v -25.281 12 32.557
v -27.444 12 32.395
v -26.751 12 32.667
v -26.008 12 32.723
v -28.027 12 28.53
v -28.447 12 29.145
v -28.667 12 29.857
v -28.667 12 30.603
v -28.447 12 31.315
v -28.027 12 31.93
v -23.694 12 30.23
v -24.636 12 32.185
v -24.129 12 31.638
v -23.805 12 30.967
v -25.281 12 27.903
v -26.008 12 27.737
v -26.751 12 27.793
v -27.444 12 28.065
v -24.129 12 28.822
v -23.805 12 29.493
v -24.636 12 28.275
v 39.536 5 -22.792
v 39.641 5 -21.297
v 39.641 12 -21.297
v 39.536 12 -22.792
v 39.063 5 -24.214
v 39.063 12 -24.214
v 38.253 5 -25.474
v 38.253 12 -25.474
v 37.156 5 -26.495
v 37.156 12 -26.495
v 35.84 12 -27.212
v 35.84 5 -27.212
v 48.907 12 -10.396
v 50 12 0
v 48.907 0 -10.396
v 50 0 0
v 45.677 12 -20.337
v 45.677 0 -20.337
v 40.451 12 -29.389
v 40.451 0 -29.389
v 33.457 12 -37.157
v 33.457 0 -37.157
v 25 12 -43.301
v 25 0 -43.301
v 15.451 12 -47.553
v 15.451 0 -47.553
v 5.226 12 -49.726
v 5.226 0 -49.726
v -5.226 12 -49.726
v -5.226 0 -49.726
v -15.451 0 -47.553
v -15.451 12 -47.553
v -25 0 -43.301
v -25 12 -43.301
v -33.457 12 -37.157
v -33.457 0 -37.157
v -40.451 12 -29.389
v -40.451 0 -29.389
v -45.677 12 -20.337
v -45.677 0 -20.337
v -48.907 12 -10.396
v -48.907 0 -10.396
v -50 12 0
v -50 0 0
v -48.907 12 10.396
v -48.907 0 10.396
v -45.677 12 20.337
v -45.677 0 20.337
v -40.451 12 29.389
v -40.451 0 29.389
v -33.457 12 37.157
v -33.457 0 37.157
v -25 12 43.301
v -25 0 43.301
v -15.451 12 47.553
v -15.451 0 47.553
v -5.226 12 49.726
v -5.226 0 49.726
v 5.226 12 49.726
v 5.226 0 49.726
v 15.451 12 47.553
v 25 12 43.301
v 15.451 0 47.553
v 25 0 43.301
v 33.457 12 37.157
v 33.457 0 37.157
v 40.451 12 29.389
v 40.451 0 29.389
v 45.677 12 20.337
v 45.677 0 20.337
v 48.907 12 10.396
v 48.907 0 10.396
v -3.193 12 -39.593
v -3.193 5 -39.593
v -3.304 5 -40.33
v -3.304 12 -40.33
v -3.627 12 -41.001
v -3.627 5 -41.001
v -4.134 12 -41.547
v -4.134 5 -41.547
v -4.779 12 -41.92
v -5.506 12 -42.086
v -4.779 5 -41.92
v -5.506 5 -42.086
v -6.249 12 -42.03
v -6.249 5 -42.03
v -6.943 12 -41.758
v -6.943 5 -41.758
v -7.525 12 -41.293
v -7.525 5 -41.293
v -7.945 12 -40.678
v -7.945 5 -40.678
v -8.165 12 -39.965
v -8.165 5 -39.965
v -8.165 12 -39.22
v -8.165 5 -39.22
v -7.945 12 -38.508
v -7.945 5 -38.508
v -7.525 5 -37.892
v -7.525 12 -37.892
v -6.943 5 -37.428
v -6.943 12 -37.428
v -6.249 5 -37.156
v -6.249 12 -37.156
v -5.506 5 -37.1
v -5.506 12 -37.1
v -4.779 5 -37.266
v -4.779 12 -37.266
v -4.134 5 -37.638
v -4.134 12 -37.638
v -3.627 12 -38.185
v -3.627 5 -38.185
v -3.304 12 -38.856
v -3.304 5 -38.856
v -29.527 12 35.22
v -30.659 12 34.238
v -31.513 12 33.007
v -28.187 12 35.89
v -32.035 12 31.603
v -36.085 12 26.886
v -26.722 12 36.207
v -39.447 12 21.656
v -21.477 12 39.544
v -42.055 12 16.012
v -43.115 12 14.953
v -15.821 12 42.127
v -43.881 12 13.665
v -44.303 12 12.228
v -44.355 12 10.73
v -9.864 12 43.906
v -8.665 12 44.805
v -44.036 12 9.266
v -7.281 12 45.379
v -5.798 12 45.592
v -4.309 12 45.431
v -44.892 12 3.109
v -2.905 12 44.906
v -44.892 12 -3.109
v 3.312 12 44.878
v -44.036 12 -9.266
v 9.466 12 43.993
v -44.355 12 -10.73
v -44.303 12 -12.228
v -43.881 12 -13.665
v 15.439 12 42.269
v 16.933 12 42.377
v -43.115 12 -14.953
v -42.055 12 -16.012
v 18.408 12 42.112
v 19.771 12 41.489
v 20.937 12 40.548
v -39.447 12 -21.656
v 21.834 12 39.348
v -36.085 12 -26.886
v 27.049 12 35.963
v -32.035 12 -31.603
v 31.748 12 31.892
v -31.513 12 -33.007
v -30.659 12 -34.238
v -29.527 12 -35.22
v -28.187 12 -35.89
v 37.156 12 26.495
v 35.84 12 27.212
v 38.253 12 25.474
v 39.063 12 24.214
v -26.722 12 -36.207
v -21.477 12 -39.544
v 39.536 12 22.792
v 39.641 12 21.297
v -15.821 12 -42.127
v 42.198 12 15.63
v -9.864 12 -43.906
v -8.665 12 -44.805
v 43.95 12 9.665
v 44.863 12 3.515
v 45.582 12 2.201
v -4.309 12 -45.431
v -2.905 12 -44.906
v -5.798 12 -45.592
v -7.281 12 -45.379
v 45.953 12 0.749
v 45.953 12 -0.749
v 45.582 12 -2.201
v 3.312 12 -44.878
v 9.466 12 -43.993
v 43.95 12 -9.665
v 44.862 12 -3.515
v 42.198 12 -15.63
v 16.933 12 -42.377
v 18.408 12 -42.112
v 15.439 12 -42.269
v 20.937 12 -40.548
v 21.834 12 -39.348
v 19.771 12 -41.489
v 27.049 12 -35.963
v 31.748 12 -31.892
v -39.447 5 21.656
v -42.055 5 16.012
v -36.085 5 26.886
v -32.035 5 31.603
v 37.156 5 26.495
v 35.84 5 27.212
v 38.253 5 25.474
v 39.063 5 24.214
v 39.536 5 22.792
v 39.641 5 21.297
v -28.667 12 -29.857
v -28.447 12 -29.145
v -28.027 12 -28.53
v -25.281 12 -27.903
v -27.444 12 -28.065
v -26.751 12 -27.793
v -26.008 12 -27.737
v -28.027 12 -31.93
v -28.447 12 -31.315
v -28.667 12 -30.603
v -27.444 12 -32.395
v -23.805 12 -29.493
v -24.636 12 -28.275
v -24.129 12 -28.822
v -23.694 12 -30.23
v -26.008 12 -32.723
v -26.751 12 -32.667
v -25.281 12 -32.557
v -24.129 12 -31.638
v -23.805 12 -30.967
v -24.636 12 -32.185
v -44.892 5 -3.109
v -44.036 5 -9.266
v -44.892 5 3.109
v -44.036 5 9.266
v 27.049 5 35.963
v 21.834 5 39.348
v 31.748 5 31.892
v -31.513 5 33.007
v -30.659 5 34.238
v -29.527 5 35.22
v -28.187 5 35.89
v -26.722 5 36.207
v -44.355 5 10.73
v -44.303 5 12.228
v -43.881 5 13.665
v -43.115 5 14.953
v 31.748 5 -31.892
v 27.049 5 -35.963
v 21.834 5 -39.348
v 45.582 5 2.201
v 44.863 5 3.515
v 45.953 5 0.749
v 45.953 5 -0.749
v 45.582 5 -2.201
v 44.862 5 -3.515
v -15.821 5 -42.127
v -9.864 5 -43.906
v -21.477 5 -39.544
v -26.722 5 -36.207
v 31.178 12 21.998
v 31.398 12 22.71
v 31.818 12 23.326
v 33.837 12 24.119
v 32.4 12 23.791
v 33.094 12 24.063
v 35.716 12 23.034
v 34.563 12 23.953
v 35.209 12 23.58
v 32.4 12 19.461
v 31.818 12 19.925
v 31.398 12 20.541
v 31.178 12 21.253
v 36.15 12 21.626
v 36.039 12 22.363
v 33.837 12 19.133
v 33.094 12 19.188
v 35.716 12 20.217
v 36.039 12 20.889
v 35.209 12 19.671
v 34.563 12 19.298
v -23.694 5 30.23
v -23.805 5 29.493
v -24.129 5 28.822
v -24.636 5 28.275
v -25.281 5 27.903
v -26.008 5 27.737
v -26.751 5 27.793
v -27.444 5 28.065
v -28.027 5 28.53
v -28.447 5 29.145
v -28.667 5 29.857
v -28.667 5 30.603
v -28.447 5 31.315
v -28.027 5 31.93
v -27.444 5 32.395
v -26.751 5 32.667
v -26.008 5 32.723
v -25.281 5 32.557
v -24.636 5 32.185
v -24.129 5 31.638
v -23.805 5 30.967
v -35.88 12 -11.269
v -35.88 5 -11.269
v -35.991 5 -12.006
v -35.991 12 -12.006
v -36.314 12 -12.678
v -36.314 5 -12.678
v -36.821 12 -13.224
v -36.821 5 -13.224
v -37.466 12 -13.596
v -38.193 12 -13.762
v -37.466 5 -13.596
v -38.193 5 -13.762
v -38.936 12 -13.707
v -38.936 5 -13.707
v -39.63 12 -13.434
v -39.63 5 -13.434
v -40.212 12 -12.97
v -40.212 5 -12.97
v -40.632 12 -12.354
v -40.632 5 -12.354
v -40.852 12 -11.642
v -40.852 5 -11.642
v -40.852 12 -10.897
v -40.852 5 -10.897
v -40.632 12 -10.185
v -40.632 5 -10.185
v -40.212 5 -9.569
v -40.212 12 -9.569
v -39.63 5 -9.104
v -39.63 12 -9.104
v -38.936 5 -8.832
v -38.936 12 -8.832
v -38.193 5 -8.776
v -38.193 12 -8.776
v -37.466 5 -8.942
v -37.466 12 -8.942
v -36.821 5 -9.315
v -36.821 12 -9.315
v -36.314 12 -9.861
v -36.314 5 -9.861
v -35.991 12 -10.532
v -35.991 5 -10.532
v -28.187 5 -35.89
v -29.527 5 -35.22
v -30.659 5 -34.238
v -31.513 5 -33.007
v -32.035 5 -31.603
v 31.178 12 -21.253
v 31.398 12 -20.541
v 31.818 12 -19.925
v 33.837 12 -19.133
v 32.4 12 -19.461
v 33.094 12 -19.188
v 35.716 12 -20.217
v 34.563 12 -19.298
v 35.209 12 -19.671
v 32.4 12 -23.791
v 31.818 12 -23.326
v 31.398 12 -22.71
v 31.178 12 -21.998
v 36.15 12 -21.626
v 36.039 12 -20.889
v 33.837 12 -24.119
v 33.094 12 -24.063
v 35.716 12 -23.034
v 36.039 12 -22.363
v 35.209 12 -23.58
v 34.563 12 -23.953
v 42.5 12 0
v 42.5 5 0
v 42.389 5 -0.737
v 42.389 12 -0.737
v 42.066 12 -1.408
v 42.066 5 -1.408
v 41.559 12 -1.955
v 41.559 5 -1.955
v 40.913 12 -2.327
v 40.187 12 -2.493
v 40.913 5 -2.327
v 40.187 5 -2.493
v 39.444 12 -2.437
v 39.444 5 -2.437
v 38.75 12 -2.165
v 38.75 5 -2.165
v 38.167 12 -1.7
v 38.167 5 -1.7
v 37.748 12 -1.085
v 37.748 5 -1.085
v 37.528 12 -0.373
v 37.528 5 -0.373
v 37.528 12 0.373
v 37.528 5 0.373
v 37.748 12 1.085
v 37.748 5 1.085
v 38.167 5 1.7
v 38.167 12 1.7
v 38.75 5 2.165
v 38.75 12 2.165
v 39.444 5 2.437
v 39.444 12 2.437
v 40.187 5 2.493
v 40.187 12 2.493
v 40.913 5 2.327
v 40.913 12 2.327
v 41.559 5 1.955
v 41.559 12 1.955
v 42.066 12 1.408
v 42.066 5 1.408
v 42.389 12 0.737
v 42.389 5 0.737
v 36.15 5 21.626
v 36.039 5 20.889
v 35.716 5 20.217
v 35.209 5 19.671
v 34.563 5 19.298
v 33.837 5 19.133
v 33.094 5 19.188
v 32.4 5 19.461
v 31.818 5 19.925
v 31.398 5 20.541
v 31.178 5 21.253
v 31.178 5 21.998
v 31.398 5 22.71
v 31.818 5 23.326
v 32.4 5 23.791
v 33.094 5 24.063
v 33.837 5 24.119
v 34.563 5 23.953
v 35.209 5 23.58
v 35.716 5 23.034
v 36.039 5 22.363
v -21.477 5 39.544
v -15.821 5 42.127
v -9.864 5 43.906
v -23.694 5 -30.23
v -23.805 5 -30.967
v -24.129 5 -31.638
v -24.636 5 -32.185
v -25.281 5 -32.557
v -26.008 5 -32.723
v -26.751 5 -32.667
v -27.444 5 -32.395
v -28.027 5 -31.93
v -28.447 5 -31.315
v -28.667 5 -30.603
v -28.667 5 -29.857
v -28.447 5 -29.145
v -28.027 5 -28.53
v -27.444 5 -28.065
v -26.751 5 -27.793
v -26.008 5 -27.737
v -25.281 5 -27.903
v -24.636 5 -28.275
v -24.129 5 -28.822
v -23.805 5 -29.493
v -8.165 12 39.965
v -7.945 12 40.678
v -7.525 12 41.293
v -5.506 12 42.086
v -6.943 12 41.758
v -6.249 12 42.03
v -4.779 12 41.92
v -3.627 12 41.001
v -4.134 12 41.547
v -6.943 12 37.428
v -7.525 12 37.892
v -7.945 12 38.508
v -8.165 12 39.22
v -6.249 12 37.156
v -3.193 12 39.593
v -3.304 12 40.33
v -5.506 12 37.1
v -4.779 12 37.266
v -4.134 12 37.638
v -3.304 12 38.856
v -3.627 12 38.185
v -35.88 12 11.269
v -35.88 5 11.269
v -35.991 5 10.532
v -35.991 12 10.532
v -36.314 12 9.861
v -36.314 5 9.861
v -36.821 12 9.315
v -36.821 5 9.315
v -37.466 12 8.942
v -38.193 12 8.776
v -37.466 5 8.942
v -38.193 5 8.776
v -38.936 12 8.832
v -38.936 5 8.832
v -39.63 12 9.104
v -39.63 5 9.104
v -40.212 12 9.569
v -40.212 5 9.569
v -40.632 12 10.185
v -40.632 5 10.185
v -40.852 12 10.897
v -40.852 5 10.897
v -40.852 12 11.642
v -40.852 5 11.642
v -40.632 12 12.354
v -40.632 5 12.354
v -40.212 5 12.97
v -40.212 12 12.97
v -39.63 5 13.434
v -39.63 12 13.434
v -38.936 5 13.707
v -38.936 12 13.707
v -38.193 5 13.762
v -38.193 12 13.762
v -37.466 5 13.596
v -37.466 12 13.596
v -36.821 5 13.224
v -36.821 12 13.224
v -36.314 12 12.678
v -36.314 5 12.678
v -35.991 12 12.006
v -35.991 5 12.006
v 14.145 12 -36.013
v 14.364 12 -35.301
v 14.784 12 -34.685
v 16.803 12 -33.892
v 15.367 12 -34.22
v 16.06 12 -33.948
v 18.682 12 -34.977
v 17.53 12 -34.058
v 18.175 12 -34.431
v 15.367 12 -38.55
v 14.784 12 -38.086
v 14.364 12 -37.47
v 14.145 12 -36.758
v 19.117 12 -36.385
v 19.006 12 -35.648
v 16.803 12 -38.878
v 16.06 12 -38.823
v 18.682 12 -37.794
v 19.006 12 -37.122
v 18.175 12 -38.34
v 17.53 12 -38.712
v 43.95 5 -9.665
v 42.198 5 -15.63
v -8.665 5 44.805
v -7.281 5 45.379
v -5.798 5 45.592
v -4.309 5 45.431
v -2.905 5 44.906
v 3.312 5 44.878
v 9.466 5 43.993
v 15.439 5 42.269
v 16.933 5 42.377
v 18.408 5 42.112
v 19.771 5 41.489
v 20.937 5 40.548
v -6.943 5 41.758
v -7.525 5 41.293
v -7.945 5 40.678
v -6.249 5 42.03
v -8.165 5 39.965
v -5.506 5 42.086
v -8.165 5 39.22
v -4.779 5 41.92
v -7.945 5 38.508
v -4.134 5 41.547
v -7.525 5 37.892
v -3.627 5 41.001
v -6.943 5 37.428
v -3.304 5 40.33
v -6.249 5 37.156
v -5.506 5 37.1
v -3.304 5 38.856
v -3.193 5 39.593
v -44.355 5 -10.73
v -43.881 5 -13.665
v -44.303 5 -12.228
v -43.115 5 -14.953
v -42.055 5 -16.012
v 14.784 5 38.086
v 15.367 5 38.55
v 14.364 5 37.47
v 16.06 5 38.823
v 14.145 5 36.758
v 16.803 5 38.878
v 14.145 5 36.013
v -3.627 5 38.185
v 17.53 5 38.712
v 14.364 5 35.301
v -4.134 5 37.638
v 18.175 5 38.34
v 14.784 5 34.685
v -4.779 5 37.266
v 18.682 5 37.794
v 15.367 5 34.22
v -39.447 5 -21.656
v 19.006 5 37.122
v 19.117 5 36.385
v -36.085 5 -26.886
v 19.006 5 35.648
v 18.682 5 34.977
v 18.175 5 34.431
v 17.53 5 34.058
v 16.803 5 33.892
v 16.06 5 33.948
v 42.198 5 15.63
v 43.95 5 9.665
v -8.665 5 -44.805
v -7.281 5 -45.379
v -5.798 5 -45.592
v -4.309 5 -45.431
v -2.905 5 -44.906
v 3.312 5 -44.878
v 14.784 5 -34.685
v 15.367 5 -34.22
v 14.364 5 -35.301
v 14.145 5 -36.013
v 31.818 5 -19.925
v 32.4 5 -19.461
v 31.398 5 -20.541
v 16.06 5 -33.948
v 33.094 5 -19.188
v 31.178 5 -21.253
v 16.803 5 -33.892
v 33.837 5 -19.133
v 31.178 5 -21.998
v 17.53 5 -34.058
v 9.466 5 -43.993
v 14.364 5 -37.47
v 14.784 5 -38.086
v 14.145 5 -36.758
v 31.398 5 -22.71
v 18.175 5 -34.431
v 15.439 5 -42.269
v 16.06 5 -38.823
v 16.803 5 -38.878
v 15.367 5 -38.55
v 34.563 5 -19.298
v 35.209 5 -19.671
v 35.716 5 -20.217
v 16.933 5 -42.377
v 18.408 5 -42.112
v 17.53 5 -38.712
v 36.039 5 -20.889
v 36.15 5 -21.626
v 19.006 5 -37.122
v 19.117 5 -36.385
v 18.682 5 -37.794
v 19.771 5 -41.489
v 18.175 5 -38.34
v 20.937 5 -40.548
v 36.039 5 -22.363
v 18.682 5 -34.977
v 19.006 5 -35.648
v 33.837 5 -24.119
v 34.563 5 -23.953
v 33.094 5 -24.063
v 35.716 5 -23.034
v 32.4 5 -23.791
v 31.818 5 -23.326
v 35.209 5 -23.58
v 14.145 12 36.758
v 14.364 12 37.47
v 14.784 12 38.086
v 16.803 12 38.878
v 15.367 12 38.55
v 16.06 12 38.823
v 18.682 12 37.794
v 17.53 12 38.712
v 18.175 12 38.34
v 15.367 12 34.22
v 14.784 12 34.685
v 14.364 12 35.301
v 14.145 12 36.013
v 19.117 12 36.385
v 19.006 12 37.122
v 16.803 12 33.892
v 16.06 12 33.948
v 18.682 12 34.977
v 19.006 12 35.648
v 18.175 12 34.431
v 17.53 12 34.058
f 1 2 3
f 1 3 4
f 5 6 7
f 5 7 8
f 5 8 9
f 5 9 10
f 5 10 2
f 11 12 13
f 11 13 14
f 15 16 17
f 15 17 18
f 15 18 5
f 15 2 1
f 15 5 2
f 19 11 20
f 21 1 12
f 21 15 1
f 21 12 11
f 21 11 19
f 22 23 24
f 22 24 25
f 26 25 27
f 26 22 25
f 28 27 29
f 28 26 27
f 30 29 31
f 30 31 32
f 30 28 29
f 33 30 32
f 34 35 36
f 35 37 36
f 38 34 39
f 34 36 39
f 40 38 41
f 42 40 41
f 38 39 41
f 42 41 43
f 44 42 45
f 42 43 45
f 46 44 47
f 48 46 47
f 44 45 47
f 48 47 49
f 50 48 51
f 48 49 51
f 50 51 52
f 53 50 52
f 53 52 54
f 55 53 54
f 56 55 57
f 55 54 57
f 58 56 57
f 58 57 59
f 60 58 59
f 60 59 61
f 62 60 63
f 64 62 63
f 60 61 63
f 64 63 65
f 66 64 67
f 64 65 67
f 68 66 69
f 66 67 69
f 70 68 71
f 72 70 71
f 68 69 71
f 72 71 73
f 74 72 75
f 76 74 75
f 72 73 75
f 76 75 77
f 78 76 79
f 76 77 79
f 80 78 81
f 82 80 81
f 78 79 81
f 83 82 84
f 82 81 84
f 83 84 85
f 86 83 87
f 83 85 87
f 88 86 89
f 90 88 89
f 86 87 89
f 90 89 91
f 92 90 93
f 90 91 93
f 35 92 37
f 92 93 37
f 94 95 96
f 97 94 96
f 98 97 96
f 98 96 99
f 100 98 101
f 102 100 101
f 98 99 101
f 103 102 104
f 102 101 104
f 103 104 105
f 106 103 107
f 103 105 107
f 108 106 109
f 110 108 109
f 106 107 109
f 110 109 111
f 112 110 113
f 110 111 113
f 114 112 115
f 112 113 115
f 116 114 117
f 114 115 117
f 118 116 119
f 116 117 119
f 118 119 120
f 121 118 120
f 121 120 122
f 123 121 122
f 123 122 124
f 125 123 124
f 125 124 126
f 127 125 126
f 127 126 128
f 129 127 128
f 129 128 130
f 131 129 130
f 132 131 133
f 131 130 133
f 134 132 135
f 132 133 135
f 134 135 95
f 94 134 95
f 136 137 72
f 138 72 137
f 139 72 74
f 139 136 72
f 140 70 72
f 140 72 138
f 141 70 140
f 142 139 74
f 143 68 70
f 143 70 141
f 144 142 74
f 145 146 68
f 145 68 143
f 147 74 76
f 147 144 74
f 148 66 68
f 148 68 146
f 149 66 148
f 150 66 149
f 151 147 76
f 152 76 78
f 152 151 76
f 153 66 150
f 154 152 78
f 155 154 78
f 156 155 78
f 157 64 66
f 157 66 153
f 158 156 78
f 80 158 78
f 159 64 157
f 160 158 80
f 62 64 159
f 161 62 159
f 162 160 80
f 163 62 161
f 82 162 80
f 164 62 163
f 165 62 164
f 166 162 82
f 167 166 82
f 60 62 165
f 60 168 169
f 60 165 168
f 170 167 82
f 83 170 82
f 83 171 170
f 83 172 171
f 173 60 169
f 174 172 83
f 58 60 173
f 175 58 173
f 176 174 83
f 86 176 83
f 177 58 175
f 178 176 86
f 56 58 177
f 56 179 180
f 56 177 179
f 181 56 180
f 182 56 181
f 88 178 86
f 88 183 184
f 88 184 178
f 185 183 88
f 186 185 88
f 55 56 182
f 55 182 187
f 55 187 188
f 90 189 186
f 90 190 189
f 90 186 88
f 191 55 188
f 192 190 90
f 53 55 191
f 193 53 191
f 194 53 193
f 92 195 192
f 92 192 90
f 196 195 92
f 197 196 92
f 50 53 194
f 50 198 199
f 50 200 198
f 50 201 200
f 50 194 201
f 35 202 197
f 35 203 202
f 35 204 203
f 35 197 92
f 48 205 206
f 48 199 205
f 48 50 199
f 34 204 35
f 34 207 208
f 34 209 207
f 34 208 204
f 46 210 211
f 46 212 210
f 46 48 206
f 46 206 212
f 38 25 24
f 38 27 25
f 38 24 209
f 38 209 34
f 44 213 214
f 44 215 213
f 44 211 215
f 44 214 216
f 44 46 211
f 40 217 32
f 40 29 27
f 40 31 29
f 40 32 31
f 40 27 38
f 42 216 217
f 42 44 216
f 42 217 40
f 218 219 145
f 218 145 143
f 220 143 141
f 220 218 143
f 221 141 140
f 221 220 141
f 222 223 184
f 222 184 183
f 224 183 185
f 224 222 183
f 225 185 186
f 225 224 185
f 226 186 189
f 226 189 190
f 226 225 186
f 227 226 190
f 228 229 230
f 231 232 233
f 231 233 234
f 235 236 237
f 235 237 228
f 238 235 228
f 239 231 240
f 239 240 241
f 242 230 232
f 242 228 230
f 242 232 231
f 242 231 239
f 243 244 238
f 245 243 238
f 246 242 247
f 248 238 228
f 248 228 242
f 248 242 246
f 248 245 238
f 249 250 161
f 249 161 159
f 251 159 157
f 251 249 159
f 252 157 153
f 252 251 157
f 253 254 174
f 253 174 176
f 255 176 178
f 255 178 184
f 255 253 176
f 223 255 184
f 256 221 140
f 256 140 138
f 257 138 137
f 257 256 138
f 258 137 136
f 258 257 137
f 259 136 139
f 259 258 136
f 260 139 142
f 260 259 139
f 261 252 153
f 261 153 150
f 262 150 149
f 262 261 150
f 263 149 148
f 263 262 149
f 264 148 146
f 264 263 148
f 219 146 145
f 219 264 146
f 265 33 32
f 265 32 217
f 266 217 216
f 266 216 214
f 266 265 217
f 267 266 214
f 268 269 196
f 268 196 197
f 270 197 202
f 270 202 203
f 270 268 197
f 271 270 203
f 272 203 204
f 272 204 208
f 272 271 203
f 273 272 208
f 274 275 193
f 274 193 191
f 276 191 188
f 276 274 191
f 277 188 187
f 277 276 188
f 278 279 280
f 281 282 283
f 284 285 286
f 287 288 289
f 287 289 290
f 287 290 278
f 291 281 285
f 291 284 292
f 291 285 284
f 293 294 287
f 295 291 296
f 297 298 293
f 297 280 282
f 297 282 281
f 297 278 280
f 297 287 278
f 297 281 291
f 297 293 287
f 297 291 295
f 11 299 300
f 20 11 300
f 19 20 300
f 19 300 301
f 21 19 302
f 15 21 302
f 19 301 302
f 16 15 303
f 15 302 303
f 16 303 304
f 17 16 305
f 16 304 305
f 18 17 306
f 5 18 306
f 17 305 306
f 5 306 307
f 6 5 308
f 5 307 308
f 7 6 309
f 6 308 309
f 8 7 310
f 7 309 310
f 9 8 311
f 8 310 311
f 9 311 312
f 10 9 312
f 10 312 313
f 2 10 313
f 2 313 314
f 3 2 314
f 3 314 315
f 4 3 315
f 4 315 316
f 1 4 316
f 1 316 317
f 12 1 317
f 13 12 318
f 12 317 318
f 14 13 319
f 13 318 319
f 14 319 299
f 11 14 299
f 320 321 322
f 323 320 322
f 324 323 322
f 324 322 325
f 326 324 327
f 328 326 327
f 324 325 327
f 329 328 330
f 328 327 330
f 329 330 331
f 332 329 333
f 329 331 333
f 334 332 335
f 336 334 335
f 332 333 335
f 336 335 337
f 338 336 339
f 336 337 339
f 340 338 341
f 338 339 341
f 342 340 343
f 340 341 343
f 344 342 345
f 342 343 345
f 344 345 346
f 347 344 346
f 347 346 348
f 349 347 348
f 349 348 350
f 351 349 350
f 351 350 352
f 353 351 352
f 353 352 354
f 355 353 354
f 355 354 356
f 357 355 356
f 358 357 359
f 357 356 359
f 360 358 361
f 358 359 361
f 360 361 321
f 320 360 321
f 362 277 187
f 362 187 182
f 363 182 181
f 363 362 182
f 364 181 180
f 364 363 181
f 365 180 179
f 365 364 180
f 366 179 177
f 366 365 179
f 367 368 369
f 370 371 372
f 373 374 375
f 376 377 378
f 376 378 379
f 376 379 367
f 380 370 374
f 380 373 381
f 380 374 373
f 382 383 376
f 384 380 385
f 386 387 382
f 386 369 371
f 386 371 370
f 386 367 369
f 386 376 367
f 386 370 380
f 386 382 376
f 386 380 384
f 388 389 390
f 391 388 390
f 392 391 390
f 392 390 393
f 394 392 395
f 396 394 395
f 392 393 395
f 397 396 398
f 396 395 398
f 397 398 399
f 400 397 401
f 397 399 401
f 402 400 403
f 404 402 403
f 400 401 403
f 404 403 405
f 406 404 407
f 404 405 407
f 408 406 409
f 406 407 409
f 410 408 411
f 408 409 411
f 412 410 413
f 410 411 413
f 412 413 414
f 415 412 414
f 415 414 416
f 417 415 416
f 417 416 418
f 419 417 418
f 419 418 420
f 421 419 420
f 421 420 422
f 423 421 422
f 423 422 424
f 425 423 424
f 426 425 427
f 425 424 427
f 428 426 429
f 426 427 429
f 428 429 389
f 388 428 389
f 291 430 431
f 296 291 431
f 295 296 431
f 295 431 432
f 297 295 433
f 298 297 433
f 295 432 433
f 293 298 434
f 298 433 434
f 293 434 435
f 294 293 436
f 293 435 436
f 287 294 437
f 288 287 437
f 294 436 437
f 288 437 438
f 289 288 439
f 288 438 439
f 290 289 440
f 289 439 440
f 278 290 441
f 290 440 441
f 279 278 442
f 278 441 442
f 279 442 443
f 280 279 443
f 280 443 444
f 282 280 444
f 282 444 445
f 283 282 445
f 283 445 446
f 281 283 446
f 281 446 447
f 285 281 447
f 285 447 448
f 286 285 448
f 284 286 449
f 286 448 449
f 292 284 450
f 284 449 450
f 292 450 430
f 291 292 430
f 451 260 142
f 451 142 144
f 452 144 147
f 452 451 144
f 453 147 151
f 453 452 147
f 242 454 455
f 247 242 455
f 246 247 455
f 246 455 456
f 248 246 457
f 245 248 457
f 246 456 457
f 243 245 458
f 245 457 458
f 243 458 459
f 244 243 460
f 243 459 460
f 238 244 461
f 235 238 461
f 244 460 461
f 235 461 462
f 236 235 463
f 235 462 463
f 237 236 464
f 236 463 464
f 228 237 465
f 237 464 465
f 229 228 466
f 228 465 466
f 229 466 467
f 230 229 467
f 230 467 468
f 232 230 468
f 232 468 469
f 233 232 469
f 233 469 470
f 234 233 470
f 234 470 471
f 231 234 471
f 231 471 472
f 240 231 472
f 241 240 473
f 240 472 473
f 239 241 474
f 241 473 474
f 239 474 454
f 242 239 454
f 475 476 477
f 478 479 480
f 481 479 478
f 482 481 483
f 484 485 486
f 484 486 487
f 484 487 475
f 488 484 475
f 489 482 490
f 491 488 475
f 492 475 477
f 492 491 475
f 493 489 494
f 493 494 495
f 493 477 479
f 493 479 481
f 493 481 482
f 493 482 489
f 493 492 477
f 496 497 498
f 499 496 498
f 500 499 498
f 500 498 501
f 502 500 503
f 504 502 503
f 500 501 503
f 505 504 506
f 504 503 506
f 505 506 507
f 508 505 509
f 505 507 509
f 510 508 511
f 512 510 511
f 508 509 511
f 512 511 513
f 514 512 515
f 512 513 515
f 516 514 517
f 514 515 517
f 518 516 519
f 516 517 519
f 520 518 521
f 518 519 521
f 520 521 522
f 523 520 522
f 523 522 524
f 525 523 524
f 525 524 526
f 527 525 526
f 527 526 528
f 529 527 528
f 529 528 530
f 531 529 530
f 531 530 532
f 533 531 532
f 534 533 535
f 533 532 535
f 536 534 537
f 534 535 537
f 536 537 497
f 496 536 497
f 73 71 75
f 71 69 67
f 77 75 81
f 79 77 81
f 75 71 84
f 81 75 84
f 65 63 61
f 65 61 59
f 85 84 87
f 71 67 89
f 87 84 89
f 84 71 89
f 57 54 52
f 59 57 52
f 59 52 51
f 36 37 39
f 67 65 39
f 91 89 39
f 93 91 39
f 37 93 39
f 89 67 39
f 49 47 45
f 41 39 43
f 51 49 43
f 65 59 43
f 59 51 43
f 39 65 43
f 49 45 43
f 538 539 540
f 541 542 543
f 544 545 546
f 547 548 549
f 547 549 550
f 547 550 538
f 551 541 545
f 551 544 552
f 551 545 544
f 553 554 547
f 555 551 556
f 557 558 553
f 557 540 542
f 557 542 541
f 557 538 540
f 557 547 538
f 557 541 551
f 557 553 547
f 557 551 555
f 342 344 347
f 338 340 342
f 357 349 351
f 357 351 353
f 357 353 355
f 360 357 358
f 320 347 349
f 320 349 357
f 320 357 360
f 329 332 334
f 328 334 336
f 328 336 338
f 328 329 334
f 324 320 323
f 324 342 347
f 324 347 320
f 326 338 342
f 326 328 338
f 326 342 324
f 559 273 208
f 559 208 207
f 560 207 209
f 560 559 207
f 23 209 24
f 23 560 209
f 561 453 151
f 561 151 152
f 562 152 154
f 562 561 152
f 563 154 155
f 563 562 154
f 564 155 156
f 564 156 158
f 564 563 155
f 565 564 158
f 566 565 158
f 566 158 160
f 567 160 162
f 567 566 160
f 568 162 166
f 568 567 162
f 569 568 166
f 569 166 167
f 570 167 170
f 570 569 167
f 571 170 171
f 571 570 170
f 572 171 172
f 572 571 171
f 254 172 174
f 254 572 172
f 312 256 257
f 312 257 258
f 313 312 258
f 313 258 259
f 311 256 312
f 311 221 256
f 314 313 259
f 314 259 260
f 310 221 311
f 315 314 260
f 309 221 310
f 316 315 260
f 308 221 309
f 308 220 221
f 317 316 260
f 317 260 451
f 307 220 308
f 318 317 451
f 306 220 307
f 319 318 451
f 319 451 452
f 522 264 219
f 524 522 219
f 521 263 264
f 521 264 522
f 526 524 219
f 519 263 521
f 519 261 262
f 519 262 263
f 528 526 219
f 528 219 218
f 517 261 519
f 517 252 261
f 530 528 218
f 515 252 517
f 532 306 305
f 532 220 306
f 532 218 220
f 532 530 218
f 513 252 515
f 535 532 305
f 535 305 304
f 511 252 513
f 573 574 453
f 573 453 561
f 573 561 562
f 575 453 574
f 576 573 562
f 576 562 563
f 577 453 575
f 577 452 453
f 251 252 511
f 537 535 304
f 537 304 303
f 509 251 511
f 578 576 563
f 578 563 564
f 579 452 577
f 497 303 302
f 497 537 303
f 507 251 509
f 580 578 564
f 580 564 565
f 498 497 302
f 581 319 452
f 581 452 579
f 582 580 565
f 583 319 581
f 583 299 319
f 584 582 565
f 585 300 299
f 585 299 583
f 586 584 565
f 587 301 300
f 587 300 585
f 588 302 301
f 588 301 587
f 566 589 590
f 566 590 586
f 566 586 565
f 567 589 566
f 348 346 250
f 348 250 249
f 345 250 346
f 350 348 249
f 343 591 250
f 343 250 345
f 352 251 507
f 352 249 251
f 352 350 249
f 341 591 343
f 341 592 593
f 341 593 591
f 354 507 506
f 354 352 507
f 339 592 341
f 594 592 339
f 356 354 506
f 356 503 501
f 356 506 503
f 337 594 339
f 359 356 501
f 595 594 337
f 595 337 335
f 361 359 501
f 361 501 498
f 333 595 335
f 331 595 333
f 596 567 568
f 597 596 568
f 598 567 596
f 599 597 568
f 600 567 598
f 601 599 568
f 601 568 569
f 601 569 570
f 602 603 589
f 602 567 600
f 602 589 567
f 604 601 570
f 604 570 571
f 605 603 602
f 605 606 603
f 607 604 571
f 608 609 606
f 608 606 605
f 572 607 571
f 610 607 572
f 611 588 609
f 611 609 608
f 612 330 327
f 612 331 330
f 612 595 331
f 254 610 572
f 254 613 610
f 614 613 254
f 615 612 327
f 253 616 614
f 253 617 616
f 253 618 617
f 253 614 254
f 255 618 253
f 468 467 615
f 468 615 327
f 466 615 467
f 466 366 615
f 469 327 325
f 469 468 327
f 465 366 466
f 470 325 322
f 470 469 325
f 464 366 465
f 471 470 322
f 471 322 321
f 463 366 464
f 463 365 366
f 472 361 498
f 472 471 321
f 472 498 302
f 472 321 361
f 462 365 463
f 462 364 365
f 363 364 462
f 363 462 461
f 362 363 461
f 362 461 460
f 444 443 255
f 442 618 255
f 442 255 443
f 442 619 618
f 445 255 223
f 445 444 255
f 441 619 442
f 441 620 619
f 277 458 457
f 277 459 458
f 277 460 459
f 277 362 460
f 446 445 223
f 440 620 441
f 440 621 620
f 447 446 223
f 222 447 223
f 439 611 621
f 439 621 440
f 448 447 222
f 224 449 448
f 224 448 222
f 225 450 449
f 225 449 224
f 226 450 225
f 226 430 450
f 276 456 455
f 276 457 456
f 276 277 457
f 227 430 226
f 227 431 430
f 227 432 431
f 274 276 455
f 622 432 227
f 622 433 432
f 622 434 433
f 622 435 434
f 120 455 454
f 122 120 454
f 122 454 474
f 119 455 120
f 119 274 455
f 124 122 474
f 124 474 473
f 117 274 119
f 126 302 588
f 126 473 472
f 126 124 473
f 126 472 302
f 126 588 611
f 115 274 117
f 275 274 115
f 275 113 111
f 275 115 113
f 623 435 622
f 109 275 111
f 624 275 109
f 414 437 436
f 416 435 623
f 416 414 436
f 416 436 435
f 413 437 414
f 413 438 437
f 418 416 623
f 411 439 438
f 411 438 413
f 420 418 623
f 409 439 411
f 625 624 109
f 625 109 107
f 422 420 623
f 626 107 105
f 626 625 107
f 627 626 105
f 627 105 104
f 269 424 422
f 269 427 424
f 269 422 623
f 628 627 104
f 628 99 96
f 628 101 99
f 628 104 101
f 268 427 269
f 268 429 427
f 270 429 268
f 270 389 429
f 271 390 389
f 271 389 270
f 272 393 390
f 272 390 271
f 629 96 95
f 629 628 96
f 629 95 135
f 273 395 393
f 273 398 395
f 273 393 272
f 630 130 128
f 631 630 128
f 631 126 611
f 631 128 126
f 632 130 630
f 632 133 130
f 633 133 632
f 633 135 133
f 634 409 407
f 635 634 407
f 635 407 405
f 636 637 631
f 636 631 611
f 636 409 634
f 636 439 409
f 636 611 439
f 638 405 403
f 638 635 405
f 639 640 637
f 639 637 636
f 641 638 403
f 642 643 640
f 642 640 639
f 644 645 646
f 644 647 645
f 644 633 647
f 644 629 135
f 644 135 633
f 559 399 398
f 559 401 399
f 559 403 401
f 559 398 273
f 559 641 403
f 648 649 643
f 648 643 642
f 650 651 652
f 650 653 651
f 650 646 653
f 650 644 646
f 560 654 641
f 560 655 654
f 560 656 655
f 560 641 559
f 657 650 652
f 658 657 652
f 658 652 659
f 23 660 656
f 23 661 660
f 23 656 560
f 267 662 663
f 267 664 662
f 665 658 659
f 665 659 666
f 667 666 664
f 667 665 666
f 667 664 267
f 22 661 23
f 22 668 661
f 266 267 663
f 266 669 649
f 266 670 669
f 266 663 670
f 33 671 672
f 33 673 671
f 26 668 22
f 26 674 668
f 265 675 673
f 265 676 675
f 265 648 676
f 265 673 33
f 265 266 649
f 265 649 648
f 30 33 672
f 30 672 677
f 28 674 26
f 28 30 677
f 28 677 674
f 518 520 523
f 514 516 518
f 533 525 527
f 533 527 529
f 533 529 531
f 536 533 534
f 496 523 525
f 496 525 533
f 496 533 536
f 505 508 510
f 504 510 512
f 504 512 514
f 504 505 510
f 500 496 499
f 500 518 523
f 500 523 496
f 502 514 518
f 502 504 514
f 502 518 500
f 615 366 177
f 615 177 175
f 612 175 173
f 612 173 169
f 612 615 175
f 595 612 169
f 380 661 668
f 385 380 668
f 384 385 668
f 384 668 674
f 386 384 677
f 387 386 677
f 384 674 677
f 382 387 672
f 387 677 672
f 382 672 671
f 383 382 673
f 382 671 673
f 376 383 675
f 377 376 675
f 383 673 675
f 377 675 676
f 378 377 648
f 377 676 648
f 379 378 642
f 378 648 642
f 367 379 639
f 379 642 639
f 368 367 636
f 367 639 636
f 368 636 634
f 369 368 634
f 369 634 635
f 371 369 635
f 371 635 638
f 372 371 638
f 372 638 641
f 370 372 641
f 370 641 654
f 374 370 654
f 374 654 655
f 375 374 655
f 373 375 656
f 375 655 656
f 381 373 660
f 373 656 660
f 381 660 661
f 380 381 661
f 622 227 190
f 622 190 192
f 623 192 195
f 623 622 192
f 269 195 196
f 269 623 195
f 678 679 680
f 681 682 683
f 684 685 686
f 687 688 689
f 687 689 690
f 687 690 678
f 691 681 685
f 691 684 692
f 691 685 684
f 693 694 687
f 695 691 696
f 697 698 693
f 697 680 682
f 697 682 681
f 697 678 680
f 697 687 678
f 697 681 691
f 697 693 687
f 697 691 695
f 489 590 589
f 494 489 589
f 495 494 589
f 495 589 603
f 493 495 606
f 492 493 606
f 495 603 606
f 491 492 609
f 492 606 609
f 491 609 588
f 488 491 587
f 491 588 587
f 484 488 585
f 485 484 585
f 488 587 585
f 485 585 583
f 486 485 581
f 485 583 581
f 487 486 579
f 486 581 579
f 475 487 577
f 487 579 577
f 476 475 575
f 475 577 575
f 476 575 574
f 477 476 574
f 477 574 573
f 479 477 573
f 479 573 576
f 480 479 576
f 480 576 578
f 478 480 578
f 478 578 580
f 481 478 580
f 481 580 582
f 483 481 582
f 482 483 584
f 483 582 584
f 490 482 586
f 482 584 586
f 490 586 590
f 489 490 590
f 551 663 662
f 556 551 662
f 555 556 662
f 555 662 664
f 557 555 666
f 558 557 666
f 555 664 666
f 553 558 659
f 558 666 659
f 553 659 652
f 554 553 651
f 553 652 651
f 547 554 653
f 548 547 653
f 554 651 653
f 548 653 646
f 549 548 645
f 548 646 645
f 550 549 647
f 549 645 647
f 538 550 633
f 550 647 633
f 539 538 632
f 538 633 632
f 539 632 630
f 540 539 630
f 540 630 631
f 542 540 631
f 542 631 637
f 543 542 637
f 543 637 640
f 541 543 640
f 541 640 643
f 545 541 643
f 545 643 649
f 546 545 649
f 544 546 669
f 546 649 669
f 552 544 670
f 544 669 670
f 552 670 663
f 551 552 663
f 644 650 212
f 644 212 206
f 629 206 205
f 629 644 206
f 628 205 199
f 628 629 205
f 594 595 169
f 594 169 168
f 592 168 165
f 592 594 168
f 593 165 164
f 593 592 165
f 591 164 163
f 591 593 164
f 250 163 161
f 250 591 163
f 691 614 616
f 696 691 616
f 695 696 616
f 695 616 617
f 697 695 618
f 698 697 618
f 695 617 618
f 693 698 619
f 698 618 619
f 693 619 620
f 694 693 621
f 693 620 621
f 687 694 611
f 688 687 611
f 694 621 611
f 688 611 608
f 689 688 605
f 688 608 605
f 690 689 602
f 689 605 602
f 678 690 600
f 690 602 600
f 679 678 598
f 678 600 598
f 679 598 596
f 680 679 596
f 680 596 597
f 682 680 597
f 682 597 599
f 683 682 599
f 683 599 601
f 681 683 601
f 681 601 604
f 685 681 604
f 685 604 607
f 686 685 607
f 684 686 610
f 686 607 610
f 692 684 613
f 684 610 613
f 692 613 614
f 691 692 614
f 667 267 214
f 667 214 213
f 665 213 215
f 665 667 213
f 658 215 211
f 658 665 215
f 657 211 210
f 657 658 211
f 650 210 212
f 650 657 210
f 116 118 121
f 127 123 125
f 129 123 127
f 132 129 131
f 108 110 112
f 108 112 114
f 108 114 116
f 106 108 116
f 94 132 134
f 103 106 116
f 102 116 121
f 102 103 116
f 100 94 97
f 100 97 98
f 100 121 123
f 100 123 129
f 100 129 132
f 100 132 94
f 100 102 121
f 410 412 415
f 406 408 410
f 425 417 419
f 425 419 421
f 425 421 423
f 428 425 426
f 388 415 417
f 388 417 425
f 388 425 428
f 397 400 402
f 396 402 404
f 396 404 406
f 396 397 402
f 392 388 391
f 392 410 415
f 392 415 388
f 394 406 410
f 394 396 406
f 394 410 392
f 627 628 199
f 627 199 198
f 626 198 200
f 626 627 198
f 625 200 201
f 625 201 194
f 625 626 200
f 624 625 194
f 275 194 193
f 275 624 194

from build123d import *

# Parameters (mm, degrees)
SKETCH2_R           = 50
BOSS_EXTRUDE1_DEPTH = 5
SKETCH3_R           = 2.5
BOSS_EXTRUDE2_DEPTH = 7
SKETCH4_R           = 50
BOSS_EXTRUDE3_DEPTH = 7


with BuildPart() as part:
    # Sketch2 → Boss-Extrude1 (new body)
    with BuildSketch(Plane(origin=(0, 0, 0), x_dir=(1, 0, 0), z_dir=(0, 1, 0))):
        Circle(SKETCH2_R)
    extrude(amount=BOSS_EXTRUDE1_DEPTH)

    # Sketch3 → Boss-Extrude2 (add)
    with BuildSketch(Plane(origin=(0, 5, 0), x_dir=(1, 0, 0), z_dir=(0, 1, 0))):
        with Locations((40, 0)):
            Circle(SKETCH3_R)
        with Locations((33.650141313, -21.625632698)):
            Circle(SKETCH3_R)
        with Locations((16.61660052, -36.385279814)):
            Circle(SKETCH3_R)
        with Locations((-5.692593531, -39.592857675)):
            Circle(SKETCH3_R)
        with Locations((-26.194429358, -30.229982974)):
            Circle(SKETCH3_R)
        with Locations((-38.379718945, -11.269302274)):
            Circle(SKETCH3_R)
        with Locations((-38.379718945, 11.269302274)):
            Circle(SKETCH3_R)
        with Locations((-26.194429358, 30.229982974)):
            Circle(SKETCH3_R)
        with Locations((-5.692593531, 39.592857675)):
            Circle(SKETCH3_R)
        with Locations((16.61660052, 36.385279814)):
            Circle(SKETCH3_R)
        with Locations((33.650141313, 21.625632698)):
            Circle(SKETCH3_R)
    extrude(amount=BOSS_EXTRUDE2_DEPTH)

    # Sketch4 → Boss-Extrude3 (add)
    with BuildSketch(Plane(origin=(0, 5, 0), x_dir=(1, 0, 0), z_dir=(0, 1, 0))):
        Circle(SKETCH4_R)
        with BuildLine():
            ThreePointArc((44.8625, -3.515123575), (46, 0), (44.8625, 3.515123575))
            ThreePointArc((44.8625, 3.515123575), (43.177183813, 12.677965058), (39.6411559, 21.297388547))
            ThreePointArc((39.6411559, 21.297388547), (38.69766251, 24.869477603), (35.840317333, 27.211608799))
            ThreePointArc((35.840317333, 27.211608799), (29.468733028, 34.008730846), (21.834024893, 39.348130286))
            ThreePointArc((21.834024893, 39.348130286), (19.109090598, 41.843071786), (15.439087149, 42.268600497))
            ThreePointArc((15.439087149, 42.268600497), (6.404167722, 44.541964885), (-2.905254746, 44.90611868))
            ThreePointArc((-2.905254746, 44.90611868), (-6.546482561, 45.531786327), (-9.863944118, 43.905610193))
            ThreePointArc((-9.863944118, 43.905610193), (-18.693675585, 40.933439791), (-26.722136531, 36.206731684))
            ThreePointArc((-26.722136531, 36.206731684), (-30.123593761, 34.76448042), (-32.035242822, 31.602898875))
            ThreePointArc((-32.035242822, 31.602898875), (-37.856408977, 24.328836786), (-42.054928776, 16.011963203))
            ThreePointArc((-42.054928776, 16.011963203), (-44.136676786, 12.959697615), (-44.035578281, 9.266490459))
            ThreePointArc((-44.035578281, 9.266490459), (-45, 0), (-44.035578281, -9.266490459))
            ThreePointArc((-44.035578281, -9.266490459), (-44.136676786, -12.959697615), (-42.054928776, -16.011963203))
            ThreePointArc((-42.054928776, -16.011963203), (-37.856408977, -24.328836786), (-32.035242822, -31.602898875))
            ThreePointArc((-32.035242822, -31.602898875), (-30.123593761, -34.76448042), (-26.722136531, -36.206731684))
            ThreePointArc((-26.722136531, -36.206731684), (-18.693675585, -40.933439791), (-9.863944118, -43.905610193))
            ThreePointArc((-9.863944118, -43.905610193), (-6.546482561, -45.531786327), (-2.905254746, -44.90611868))
            ThreePointArc((-2.905254746, -44.90611868), (6.404167722, -44.541964885), (15.439087149, -42.268600497))
            ThreePointArc((15.439087149, -42.268600497), (19.109090598, -41.843071786), (21.834024893, -39.348130286))
            ThreePointArc((21.834024893, -39.348130286), (29.468733028, -34.008730846), (35.840317333, -27.211608799))
            ThreePointArc((35.840317333, -27.211608799), (38.69766251, -24.869477603), (39.6411559, -21.297388547))
            ThreePointArc((39.6411559, -21.297388547), (43.177183813, -12.677965058), (44.8625, -3.515123575))
        make_face(mode=Mode.SUBTRACT)
    extrude(amount=BOSS_EXTRUDE3_DEPTH)


solid = part.part
